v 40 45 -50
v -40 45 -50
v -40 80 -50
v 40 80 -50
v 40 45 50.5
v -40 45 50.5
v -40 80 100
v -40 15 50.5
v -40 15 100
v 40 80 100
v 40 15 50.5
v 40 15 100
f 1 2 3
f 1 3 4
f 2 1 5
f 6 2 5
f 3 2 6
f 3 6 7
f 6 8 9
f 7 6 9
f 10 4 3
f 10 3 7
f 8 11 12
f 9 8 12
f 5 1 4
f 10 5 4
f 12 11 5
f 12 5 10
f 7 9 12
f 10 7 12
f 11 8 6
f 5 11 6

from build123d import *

# Parameters (mm, degrees)
SKETCH003_W     = 150
SKETCH003_H     = 80
PAD001_DEPTH    = 65
SKETCH004_W     = 100.5
SKETCH004_H     = 60
POCKET002_DEPTH = 30
SKETCH005_W     = 30
SKETCH005_H     = 100.5
POCKET003_DEPTH = 80.001


with BuildPart() as part:
    # Sketch003 (on Face1 of CopyChamfer002) → Pad001 (new body)
    with BuildSketch(Plane.ZX.offset(15)):
        with Locations((25, 0)):
            Rectangle(SKETCH003_W, SKETCH003_H)
    extrude(amount=PAD001_DEPTH)

    # Sketch004 (on Face5 of Pad001) → Pocket002 (cut)
    with BuildSketch(Plane(origin=(0, 15, 0), x_dir=(0, 0, -1), z_dir=(0, -1, 0))):
        with Locations((-0.25, 0)):
            Rectangle(SKETCH004_W, SKETCH004_H)
    extrude(amount=-POCKET002_DEPTH, mode=Mode.SUBTRACT)

    # Sketch005 (on Face1 of Pocket002) → Pocket003 (cut, through all)
    with BuildSketch(Plane.YZ.offset(40)):
        with Locations((30, 0.25)):
            Rectangle(SKETCH005_W, SKETCH005_H)
    extrude(amount=-POCKET003_DEPTH, mode=Mode.SUBTRACT)


solid = part.part
